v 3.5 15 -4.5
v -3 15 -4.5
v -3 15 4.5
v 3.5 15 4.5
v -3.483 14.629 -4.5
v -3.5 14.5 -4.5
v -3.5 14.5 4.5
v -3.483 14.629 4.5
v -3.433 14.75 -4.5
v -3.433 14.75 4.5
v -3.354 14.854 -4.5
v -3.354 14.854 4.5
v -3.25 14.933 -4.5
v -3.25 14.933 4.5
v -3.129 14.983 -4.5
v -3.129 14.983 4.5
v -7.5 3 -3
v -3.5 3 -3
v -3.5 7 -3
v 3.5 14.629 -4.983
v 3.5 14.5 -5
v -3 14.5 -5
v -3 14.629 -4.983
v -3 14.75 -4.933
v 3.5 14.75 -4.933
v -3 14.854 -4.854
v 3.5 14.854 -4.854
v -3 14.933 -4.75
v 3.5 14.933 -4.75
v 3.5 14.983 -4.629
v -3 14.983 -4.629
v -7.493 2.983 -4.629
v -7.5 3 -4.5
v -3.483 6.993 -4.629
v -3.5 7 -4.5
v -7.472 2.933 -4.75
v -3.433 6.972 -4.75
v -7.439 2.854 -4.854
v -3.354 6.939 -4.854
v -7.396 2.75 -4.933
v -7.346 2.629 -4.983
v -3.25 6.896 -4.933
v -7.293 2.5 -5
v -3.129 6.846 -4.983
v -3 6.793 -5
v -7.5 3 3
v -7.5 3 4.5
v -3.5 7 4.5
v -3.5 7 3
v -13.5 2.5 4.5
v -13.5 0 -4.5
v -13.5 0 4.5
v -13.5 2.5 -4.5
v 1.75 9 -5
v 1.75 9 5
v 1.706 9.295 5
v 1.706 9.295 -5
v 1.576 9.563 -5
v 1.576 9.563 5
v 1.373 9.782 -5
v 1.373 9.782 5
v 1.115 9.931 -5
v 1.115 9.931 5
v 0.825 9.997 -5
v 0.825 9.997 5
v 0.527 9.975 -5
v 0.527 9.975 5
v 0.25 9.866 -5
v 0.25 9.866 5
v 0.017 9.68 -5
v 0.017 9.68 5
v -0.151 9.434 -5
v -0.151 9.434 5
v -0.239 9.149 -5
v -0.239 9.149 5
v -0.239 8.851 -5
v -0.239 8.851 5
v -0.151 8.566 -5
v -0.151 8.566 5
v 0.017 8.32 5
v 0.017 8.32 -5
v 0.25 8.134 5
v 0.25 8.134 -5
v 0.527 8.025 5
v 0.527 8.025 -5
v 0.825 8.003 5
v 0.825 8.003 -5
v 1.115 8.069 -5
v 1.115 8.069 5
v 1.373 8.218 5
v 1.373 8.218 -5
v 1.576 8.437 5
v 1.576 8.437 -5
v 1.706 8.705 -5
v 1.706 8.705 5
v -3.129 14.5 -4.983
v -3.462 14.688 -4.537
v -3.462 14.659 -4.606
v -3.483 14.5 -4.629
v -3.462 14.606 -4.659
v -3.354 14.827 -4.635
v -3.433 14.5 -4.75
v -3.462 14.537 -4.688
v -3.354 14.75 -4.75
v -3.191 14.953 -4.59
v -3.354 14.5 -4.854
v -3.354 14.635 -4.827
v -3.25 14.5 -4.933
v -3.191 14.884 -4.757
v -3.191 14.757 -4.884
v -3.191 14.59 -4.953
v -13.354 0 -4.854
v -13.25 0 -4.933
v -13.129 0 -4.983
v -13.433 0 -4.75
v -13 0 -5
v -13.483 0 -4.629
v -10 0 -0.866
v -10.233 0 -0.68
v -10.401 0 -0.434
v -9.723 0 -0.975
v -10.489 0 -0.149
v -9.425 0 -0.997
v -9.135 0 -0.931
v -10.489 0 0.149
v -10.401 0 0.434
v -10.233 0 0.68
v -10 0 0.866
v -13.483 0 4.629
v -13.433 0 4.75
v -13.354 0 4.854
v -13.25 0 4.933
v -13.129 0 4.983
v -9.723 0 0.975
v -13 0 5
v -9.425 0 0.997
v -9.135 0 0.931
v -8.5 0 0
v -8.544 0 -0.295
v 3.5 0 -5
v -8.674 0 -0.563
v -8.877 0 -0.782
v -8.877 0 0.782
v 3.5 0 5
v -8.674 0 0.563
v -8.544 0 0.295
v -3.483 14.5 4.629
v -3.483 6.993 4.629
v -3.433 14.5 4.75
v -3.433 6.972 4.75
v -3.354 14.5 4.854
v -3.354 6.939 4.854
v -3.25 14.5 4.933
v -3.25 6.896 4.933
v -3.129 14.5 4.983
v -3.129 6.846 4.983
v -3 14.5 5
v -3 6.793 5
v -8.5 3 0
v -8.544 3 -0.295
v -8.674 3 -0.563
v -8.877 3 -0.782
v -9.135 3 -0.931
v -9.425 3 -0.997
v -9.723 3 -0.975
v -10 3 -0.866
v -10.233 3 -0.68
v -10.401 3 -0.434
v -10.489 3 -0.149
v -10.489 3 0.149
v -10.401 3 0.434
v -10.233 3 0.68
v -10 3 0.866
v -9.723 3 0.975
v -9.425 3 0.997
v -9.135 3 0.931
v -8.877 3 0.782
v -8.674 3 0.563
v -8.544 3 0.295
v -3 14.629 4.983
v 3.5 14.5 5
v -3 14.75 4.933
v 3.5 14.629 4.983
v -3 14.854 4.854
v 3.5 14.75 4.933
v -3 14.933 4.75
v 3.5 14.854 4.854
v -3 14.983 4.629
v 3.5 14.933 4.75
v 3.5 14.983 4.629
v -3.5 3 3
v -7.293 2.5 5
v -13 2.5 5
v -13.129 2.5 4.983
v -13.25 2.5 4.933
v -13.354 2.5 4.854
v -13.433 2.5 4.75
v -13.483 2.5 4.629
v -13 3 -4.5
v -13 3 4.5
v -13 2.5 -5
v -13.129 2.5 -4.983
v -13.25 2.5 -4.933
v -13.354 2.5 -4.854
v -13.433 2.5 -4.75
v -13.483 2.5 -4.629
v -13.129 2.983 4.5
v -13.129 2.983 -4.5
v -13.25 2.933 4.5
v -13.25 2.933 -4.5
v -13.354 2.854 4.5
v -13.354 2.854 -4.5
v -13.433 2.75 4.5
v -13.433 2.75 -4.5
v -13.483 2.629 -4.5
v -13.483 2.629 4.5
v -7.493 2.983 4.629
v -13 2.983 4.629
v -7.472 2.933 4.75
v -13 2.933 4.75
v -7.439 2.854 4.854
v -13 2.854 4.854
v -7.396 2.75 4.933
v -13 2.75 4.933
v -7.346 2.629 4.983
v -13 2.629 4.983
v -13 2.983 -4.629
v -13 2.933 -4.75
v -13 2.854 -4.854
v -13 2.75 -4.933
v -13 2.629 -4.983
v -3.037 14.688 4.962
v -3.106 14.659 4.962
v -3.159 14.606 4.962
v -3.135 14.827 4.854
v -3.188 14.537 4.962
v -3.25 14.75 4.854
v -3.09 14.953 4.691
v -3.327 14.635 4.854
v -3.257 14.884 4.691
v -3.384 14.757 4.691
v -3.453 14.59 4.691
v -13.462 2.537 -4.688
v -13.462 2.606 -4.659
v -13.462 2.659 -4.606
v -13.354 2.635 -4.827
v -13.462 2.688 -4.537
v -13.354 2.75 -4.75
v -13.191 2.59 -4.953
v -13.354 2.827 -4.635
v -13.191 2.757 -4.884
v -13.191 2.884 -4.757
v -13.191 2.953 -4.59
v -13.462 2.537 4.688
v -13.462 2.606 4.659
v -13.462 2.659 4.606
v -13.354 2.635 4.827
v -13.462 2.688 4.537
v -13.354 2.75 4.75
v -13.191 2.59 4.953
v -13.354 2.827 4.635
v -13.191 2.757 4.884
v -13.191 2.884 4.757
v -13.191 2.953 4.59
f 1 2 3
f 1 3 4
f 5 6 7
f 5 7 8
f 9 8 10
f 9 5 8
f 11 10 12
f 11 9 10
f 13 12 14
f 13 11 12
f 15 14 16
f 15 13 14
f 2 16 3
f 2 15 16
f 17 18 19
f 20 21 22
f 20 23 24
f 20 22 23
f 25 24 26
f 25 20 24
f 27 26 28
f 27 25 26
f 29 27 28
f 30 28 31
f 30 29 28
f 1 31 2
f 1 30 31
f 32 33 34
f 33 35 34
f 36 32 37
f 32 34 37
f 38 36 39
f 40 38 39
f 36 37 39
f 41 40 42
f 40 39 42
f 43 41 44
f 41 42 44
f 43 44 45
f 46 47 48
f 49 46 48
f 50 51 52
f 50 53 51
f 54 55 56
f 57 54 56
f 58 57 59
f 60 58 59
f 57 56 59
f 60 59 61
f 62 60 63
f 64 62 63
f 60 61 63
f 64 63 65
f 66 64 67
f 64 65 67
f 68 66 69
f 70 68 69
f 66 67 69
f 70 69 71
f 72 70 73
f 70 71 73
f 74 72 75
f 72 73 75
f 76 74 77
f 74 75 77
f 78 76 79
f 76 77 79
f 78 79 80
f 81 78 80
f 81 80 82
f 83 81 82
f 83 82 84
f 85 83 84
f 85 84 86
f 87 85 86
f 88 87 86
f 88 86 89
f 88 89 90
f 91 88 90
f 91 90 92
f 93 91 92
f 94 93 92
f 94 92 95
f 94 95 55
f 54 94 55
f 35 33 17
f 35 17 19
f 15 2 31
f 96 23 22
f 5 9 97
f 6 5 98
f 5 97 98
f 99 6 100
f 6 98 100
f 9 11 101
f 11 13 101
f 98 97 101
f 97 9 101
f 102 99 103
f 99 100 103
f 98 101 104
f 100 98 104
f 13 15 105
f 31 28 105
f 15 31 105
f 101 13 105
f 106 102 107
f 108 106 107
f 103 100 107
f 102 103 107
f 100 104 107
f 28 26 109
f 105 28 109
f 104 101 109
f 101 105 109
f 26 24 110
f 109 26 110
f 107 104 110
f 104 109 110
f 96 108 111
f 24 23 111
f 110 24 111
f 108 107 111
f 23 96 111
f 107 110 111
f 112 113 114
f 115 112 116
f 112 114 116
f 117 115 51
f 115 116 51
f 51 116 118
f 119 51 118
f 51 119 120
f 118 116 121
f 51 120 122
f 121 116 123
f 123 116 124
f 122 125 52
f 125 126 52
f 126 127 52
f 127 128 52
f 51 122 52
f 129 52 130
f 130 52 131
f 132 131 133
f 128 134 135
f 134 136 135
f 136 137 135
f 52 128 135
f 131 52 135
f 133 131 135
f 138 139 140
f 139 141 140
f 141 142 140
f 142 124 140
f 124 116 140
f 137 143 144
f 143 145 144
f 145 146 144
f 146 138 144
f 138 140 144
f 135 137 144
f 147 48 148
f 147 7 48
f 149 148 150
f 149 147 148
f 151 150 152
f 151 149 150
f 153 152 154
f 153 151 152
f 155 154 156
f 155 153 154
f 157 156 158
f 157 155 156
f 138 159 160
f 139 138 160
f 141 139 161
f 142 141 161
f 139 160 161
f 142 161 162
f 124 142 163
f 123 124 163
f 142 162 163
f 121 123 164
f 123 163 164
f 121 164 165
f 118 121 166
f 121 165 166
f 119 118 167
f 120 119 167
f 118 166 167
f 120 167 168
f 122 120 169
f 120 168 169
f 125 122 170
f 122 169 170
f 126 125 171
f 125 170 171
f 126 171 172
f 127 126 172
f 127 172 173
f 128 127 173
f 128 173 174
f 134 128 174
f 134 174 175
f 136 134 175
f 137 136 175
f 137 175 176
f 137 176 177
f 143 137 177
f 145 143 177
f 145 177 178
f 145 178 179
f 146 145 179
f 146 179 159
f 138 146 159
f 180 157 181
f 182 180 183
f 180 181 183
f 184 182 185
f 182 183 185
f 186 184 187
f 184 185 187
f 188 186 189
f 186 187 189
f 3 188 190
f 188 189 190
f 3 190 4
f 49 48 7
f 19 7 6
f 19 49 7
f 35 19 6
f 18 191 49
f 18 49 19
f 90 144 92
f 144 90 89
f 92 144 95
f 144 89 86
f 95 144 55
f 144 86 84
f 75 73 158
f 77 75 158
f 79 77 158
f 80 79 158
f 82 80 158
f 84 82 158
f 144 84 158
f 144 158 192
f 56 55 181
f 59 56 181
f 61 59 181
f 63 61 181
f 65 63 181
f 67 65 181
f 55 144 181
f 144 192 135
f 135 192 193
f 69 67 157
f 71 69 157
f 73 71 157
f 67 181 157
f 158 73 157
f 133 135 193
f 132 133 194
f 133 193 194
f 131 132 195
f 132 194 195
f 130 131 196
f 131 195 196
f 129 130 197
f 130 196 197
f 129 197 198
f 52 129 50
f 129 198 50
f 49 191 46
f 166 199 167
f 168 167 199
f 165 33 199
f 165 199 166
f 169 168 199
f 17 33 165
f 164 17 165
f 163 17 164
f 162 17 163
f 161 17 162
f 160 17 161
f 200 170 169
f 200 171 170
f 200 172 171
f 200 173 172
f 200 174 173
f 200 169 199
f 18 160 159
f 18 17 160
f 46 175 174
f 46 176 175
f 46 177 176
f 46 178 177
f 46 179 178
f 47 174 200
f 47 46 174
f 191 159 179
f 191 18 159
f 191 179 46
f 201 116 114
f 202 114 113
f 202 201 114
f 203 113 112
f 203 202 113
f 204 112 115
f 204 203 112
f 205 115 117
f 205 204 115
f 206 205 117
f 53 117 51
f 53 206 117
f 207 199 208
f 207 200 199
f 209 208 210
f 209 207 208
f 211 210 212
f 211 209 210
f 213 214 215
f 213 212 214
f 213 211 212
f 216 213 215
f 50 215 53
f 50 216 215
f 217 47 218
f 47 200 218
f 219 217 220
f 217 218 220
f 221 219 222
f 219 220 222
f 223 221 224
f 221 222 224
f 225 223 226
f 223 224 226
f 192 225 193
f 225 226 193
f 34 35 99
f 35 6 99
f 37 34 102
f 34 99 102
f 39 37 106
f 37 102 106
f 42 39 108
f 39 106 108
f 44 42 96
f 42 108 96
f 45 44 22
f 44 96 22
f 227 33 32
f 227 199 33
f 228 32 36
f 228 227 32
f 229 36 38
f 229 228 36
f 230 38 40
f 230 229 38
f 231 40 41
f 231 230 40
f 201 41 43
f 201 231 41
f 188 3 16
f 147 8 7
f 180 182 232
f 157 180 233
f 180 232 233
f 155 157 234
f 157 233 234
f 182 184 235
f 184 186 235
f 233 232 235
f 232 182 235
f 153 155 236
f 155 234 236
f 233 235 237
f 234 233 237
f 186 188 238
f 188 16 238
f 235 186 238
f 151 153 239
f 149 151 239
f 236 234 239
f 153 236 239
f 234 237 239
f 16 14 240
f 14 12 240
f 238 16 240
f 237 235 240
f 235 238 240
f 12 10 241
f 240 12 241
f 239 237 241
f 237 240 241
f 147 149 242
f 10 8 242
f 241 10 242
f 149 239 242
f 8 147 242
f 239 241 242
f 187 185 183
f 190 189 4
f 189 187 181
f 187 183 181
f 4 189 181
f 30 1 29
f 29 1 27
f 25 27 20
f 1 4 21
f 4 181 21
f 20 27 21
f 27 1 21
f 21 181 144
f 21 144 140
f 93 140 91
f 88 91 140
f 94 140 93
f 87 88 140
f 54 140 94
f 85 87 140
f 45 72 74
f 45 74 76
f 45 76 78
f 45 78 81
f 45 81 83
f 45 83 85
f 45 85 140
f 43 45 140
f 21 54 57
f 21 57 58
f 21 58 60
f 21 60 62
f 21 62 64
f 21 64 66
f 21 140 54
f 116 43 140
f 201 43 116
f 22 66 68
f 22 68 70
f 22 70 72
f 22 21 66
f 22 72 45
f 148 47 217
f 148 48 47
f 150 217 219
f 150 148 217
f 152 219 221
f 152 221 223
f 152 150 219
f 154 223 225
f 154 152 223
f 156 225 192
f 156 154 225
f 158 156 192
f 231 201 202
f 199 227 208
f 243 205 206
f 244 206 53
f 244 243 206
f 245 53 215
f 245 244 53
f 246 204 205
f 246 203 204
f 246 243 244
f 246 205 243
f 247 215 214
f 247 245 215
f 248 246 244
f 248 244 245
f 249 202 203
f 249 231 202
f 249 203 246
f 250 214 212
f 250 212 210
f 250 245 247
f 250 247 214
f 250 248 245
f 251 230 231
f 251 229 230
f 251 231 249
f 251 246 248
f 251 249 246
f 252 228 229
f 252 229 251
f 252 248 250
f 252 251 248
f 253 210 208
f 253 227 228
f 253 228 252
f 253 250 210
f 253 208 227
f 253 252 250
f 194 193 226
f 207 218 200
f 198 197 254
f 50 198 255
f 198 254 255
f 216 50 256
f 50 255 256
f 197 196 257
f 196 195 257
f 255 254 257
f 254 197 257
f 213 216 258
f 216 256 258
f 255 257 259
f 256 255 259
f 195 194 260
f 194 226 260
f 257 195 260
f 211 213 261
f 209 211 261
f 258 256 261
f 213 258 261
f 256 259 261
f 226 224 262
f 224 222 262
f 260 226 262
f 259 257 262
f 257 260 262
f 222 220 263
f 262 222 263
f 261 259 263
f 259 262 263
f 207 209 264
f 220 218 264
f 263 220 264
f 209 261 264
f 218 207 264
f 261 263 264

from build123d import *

# Parameters (mm, degrees)
ESQUISSE2_W                  = 7
ESQUISSE2_H                  = 10
BOSS_EXTRU_1_DEPTH           = 15
ESQUISSE3_W                  = 10
ESQUISSE3_H                  = 3
BOSS_EXTRU_2_DEPTH           = 10
BOSS_EXTRU_3_DEPTH           = 2
ESQUISSE7_R                  = 1
ENL_V_MAT_EXTRU_1_DEPTH      = 13
ENL_V_MAT_EXTRU_1_DEPTH_BACK = 4
ESQUISSE8_R                  = 1
ENL_V_MAT_EXTRU_2_DEPTH      = 1
ENL_V_MAT_EXTRU_2_DEPTH_BACK = 11
CONG_1_R                     = 0.5


with BuildPart() as part:
    # Esquisse2 → Boss.-Extru.1 (new body)
    with BuildSketch(Plane(origin=(0, 0, 0), x_dir=(1, 0, 0), z_dir=(0, 1, 0))):
        Rectangle(ESQUISSE2_W, ESQUISSE2_H)
    extrude(amount=BOSS_EXTRU_1_DEPTH)

    # Esquisse3 → Boss.-Extru.2 (add)
    with BuildSketch(Plane.ZY.offset(3.5)):
        with Locations((0, 1.5)):
            Rectangle(ESQUISSE3_W, ESQUISSE3_H)
    extrude(amount=BOSS_EXTRU_2_DEPTH)

    # Esquisse6 → Boss.-Extru.3 (add)
    with BuildSketch(Plane.XY.offset(5)):
        Polygon((-7.5, 3), (-3.5, 7), (-3.5, 3), align=None)
    boss_extru_3 = extrude(amount=-BOSS_EXTRU_3_DEPTH)

    # Symétrie1: Boss.-Extru.3 across plane
    add(boss_extru_3.mirror(Plane.XY))

    # Esquisse7 → Enlèv. mat.-Extru.1 (cut, two sides)
    with BuildSketch(Plane(origin=(0, 3, 0), x_dir=(1, 0, 0), z_dir=(0, 1, 0))) as enl_v_mat_extru_1_sk:
        with Locations((-9.5, 0)):
            Circle(ESQUISSE7_R)
    extrude(amount=ENL_V_MAT_EXTRU_1_DEPTH, mode=Mode.SUBTRACT)
    extrude(enl_v_mat_extru_1_sk.sketch, amount=-ENL_V_MAT_EXTRU_1_DEPTH_BACK, mode=Mode.SUBTRACT)

    # Esquisse8 → Enlèv. mat.-Extru.2 (cut, two sides)
    with BuildSketch(Plane.XY.offset(5)) as enl_v_mat_extru_2_sk:
        with Locations((0.75, 9)):
            Circle(ESQUISSE8_R)
    extrude(amount=ENL_V_MAT_EXTRU_2_DEPTH, mode=Mode.SUBTRACT)
    extrude(enl_v_mat_extru_2_sk.sketch, amount=-ENL_V_MAT_EXTRU_2_DEPTH_BACK, mode=Mode.SUBTRACT)

    # Congé1
    cong_1_edges = [part.edges().sort_by_distance(p)[0] for p in [
        (0, 15, -5),
        (-10.5, 3, -5),
        (-10.5, 3, 5),
        (-13.5, 1.5, -5),
        (-13.5, 1.5, 5),
        (-13.5, 3, 0),
        (-5.5, 5, 5),
        (-3.5, 15, 0),
        (-5.5, 5, -5),
        (0, 15, 5),
        (-3.5, 11, -5),
        (-3.5, 11, 5),
    ]]
    fillet(cong_1_edges, radius=CONG_1_R)


solid = part.part
